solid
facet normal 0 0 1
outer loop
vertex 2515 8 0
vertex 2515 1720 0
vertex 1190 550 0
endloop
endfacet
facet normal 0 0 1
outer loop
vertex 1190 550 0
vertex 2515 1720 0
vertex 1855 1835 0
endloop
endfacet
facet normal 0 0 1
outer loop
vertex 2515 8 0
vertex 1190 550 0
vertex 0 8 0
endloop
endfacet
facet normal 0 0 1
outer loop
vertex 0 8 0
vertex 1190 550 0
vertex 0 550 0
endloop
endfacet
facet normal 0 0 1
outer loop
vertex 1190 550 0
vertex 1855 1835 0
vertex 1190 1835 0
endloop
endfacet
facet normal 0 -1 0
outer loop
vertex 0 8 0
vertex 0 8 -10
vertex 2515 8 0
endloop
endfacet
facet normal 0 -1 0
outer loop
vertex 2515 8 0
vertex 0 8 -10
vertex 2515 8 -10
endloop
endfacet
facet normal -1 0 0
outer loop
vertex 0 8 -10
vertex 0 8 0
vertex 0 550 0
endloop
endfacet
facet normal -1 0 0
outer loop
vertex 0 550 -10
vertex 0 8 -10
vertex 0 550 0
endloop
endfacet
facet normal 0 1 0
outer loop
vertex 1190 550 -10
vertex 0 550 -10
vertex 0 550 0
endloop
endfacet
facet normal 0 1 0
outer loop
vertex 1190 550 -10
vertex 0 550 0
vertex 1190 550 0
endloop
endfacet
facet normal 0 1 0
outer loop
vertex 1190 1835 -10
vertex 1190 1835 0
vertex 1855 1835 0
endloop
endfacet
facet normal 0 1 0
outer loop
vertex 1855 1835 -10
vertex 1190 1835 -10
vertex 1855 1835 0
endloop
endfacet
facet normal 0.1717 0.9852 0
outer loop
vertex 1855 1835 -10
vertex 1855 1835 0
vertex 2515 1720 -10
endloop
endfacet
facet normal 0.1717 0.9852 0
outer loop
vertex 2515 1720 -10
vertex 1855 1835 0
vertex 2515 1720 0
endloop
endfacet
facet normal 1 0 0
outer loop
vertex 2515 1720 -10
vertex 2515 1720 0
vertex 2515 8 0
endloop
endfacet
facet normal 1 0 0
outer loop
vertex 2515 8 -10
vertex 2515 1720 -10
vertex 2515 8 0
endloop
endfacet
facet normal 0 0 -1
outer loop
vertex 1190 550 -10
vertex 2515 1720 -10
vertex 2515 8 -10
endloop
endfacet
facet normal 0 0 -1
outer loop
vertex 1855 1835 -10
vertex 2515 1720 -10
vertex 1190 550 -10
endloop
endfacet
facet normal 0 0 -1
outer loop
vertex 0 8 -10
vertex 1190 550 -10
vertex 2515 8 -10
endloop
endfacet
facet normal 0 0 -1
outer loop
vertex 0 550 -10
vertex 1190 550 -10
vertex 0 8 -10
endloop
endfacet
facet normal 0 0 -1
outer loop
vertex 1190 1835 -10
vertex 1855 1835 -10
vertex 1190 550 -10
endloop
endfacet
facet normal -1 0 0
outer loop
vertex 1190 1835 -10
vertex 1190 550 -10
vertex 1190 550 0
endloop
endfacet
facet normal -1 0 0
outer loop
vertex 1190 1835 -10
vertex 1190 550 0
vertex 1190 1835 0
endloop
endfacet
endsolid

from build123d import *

# Parameters (mm, degrees)
TABAN_FLAN_1_DEPTH         = 10
KES_EKSTR_ZYON1_DEPTH      = 3114.286045323
KES_EKSTR_ZYON1_DEPTH_BACK = 3114.286045323
IZIM6_W                    = 1190
IZIM6_H                    = 1285
IZIM6_W_2                  = 2515
IZIM6_H_2                  = 8


# Sheet-metal steps are written as plain solids
with BuildPart() as part:
    # Çizim1 → Taban-Flanş1 (new body)
    with BuildSketch(Plane.XY):
        Polygon((0, 0), (0, 1720), (660, 1835), (1855, 1835), (2515, 1720), (2515, 0), align=None)
    extrude(amount=-TABAN_FLAN_1_DEPTH)

    # Çizim6 → Kes-Ekstrüzyon1 (cut, two sides: drawn at the far end of the back side and taken through both)
    with BuildSketch(Plane.XY.offset(-KES_EKSTR_ZYON1_DEPTH_BACK)):
        with Locations((595, 1192.5)):
            Rectangle(IZIM6_W, IZIM6_H)
        with Locations((1257.5, 4)):
            Rectangle(IZIM6_W_2, IZIM6_H_2)
    extrude(amount=KES_EKSTR_ZYON1_DEPTH + KES_EKSTR_ZYON1_DEPTH_BACK, mode=Mode.SUBTRACT)


solid = part.part
